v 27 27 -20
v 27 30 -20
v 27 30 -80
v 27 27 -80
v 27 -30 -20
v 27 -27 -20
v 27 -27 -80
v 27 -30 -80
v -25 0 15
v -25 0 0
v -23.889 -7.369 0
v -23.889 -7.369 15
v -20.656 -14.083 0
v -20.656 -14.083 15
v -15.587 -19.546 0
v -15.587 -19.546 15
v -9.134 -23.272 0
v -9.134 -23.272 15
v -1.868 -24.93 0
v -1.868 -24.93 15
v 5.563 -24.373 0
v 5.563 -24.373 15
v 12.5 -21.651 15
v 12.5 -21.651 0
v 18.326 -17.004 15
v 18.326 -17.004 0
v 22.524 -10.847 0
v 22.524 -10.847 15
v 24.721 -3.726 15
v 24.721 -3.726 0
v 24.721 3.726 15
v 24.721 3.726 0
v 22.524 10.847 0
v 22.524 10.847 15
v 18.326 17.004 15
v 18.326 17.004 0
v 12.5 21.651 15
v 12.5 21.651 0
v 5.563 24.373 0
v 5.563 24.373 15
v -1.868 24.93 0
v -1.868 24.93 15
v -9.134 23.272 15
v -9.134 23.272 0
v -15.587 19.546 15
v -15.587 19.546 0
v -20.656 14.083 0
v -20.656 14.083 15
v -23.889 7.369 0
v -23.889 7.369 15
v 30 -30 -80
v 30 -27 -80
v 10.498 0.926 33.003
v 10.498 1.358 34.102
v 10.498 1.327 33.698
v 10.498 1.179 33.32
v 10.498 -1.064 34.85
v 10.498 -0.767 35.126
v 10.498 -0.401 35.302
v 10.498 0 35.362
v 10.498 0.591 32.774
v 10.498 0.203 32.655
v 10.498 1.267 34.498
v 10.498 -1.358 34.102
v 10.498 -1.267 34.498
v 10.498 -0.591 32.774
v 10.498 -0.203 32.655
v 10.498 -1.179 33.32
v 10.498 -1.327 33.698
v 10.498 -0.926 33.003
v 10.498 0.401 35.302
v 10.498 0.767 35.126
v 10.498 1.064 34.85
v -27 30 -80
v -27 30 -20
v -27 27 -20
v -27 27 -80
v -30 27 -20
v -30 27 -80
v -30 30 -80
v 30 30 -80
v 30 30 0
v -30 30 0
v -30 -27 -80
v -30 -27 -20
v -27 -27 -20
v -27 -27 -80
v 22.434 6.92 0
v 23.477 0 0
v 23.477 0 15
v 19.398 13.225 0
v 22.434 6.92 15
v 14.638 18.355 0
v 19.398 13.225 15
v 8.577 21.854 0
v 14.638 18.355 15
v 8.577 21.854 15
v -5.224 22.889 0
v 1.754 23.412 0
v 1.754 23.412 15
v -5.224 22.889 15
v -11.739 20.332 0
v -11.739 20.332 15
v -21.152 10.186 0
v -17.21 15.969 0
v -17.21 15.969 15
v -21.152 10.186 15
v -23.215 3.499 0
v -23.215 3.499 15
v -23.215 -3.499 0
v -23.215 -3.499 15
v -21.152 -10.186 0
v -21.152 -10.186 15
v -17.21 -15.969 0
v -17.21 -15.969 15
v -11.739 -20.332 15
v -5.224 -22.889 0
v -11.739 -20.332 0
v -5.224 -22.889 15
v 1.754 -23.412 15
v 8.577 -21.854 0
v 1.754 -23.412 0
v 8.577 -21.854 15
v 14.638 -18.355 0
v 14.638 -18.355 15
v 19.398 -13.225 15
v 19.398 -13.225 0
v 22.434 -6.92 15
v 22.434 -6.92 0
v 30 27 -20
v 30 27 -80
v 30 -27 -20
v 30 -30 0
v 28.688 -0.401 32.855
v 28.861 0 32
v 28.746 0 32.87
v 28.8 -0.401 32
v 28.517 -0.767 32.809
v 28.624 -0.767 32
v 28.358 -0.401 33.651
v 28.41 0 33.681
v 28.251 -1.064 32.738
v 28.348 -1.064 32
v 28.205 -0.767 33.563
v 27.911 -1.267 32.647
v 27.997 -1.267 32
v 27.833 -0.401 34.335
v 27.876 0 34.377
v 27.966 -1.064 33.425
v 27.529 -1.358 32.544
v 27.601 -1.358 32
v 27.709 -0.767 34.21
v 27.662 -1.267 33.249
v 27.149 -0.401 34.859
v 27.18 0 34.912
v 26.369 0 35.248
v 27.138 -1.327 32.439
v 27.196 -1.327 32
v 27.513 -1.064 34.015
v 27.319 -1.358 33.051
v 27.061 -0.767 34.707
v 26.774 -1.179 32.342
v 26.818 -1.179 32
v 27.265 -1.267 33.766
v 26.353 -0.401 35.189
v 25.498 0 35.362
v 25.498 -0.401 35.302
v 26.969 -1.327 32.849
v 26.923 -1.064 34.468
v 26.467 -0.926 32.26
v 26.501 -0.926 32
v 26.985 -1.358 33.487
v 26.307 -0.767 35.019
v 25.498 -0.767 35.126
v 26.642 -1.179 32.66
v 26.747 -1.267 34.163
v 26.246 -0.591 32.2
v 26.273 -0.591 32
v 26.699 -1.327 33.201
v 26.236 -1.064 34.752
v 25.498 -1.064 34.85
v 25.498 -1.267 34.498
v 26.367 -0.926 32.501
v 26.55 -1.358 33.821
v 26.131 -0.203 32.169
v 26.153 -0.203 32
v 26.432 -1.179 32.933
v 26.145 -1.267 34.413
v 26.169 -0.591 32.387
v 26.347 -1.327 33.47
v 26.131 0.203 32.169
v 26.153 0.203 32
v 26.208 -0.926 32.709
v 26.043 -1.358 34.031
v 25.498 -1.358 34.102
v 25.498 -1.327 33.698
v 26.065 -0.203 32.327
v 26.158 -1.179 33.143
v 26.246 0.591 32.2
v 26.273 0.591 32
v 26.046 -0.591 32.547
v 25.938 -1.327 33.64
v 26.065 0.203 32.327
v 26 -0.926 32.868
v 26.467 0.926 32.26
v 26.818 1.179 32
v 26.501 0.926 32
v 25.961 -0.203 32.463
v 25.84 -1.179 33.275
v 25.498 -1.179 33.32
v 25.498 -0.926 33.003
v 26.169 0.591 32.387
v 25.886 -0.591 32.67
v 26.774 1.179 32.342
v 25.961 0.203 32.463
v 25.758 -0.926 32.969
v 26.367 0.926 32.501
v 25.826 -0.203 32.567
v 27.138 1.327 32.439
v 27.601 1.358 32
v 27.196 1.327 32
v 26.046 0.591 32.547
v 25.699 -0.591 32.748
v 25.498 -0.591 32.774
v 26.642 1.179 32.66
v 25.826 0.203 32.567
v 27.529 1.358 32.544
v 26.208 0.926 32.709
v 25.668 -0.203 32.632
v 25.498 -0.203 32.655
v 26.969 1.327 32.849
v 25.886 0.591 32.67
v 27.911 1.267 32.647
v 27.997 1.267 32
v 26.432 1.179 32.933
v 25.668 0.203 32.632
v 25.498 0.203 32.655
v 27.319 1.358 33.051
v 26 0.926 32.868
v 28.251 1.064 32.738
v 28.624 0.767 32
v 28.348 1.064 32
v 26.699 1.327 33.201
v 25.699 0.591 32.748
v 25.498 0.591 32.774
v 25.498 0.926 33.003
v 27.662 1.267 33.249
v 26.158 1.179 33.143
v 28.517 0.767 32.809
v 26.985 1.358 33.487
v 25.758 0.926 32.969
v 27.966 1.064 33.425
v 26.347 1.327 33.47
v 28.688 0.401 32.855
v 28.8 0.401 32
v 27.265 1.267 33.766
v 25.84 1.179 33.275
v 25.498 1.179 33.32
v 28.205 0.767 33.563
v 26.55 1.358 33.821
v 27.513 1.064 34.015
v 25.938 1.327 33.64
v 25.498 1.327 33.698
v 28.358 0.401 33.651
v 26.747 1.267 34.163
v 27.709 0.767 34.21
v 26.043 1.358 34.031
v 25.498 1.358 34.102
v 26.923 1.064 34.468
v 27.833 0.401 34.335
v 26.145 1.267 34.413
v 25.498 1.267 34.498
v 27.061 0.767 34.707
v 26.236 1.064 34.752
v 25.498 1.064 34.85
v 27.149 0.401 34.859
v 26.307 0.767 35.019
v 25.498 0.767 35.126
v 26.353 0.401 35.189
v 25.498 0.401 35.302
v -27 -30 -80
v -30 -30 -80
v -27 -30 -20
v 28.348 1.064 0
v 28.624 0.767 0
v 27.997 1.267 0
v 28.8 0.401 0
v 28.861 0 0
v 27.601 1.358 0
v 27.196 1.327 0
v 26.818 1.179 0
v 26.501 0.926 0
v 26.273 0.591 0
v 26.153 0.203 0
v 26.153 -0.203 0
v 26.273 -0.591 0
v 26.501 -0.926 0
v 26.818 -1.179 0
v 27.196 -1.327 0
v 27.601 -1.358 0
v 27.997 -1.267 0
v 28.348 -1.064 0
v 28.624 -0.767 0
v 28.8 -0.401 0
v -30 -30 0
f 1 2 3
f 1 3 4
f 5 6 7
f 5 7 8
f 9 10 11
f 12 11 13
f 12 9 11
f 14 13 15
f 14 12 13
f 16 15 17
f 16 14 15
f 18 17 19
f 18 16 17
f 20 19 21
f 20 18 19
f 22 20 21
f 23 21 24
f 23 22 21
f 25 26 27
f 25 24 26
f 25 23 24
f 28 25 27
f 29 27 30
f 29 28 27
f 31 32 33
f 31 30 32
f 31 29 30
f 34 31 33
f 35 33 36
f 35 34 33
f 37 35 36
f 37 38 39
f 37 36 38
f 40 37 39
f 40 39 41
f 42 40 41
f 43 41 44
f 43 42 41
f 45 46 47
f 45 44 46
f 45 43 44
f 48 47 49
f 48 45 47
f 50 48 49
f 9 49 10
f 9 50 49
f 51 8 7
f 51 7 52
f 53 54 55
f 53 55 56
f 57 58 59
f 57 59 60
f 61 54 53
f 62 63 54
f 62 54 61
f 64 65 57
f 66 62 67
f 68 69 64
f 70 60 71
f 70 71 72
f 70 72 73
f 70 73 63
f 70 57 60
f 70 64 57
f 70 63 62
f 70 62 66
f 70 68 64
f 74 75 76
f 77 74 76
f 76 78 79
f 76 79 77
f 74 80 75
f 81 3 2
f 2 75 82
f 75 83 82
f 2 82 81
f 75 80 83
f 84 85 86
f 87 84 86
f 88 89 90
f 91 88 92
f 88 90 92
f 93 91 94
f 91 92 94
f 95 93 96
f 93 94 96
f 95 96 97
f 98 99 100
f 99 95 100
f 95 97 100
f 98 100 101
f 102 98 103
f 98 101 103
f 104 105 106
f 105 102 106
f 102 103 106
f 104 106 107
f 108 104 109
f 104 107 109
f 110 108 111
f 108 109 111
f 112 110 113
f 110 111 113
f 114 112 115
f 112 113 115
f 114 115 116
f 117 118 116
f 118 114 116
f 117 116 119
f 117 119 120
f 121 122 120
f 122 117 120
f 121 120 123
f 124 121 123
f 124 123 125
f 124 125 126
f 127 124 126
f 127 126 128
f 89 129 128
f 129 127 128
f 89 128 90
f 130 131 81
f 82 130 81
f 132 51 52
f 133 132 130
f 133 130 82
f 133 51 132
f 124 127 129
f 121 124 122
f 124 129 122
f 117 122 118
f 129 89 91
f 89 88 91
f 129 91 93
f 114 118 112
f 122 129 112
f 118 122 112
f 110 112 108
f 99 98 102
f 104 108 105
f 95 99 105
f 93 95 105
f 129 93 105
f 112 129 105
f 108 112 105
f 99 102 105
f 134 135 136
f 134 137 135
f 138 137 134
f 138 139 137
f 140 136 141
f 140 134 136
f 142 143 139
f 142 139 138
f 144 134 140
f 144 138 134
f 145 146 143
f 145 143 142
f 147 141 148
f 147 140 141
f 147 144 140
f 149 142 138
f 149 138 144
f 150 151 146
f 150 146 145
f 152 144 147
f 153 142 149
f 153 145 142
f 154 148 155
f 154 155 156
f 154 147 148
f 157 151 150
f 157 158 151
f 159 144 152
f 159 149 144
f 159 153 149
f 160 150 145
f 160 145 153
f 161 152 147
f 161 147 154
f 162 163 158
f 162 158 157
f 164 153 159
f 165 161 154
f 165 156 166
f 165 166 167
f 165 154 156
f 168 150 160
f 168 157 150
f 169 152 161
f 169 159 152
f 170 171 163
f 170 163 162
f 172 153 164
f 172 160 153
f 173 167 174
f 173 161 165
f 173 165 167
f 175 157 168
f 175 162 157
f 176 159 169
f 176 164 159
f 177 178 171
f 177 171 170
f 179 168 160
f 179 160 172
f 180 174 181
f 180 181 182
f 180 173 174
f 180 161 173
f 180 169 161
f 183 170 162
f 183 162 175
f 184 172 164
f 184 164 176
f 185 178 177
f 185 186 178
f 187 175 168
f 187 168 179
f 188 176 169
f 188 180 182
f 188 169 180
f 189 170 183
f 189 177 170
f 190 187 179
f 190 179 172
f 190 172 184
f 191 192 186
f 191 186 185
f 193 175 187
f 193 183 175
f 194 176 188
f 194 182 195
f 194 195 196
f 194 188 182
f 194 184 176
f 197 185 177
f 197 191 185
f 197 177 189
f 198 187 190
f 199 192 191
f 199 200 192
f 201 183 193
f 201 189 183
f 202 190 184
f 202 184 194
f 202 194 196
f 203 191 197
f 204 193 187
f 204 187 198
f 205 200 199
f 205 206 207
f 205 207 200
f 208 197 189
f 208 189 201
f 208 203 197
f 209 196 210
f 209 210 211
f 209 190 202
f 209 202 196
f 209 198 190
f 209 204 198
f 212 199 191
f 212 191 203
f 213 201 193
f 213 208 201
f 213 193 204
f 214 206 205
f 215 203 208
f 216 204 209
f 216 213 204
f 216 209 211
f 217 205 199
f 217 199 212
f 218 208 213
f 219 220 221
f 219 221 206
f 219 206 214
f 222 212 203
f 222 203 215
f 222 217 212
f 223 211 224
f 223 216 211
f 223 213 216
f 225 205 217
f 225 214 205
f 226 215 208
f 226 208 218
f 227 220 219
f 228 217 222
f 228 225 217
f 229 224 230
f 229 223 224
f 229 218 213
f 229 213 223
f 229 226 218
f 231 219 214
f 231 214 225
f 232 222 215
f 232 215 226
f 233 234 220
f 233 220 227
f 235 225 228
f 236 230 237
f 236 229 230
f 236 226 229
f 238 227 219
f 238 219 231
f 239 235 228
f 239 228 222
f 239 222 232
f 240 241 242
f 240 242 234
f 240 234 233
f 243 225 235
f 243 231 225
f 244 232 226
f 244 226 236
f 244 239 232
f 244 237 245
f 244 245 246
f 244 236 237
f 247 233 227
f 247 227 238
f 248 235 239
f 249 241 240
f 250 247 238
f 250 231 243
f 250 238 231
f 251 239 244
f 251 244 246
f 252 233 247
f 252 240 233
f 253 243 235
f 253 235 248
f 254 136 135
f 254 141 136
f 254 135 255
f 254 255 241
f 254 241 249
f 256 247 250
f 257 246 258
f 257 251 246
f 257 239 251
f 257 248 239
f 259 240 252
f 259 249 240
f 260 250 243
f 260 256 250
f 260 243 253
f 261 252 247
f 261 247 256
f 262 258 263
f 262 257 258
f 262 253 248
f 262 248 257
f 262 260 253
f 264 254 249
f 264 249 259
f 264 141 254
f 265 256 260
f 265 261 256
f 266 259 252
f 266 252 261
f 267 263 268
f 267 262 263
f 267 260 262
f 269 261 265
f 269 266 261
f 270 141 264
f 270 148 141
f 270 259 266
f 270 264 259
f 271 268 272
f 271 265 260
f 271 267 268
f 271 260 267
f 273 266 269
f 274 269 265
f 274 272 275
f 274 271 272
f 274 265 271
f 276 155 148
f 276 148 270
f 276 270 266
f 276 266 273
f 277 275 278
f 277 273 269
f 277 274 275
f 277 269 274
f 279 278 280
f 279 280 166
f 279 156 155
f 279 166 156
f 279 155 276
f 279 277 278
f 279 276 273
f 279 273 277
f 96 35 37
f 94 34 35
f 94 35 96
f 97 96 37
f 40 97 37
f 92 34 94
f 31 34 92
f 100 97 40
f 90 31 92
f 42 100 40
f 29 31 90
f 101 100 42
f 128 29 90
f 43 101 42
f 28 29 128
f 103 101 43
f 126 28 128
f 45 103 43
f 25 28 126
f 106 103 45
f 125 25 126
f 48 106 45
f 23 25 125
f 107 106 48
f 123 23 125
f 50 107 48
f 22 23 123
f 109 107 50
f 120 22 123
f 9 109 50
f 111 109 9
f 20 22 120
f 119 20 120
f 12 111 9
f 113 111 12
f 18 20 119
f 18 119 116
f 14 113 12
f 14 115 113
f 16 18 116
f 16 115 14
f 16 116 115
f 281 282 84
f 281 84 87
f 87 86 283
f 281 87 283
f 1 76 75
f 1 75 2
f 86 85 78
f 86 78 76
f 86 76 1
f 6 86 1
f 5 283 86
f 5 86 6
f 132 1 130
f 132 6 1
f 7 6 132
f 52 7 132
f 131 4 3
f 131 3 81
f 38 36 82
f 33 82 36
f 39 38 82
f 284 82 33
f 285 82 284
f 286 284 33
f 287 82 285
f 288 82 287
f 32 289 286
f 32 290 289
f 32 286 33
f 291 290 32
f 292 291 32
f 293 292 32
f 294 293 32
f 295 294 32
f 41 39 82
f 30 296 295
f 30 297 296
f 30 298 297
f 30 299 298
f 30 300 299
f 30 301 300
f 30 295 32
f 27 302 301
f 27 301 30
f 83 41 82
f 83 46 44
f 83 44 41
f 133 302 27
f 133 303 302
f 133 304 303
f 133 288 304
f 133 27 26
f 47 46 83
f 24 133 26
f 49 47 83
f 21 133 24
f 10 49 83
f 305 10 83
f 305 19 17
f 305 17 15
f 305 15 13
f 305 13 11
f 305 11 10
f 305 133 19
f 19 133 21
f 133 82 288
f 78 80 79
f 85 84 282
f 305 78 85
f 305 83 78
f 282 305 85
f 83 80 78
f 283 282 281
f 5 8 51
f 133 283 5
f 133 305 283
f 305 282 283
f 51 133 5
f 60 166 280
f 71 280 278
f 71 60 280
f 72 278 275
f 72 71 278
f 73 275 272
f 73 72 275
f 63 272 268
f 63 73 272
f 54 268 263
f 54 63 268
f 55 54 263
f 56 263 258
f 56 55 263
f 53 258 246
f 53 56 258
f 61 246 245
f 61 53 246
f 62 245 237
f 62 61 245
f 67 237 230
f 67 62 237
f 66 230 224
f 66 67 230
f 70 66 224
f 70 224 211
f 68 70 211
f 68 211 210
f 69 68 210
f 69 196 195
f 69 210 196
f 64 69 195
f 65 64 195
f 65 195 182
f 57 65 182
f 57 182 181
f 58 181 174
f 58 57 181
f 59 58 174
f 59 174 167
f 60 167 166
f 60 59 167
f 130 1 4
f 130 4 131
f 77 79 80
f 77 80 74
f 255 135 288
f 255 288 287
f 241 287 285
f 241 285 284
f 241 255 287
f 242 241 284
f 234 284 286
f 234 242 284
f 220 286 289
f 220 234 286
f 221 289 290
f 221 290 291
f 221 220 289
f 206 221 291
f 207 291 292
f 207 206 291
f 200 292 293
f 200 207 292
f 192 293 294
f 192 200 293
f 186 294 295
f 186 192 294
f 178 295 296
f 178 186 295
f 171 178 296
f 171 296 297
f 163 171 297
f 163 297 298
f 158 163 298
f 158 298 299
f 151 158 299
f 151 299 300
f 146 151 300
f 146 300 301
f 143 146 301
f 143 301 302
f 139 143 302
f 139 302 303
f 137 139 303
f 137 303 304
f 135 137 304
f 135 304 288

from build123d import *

# Parameters (mm, degrees)
F0_W          = 25
F0_H          = 15
F2_R          = 23.4773699194
F3_DEPTH      = 18.22955
F4_W          = 30
F4_H          = 20
F5_DEPTH      = 30
F5_DEPTH_BACK = 30
F7_R          = 1.3613777444
F9_W          = 3
F9_H          = 3
F10_DEPTH     = 60


with BuildPart() as f1:
    # F0 (on Front) → F1 (revolve)
    with BuildSketch(Plane.XZ):
        with Locations((-12.5, 7.5)):
            Rectangle(F0_W, F0_H)
    revolve(axis=Axis((0, 0, 7.5), (0, 0, 1)))

    # F2 (on face) → F3 (cut)
    with BuildSketch(Plane.XY.offset(15)):
        Circle(F2_R)
    extrude(amount=-F3_DEPTH, mode=Mode.SUBTRACT)

    # F4 (on Front) → F5 (join, two sides)
    with BuildSketch(Plane.XZ) as f5_sk:
        with Locations((15, -10)):
            Rectangle(F4_W, F4_H)
        with Locations((-15, -10)):
            Rectangle(F4_W, F4_H)
    extrude(amount=F5_DEPTH)
    extrude(f5_sk.sketch, amount=-F5_DEPTH_BACK)

    # F8: sweep along a path in F6
    with BuildLine(Plane.XZ) as f8_path:
        Line((27.4984519929, 0), (27.4984519929, 32))
        ThreePointArc((27.4984519929, 32), (26.9126655552, 33.4142135624), (25.4984519929, 34))
        Line((25.4984519929, 34), (10.4984519929, 34))
    # F7 (on Top) → F8 (sweep)
    with BuildSketch(Plane.XY):
        with Locations((27.4991728365, 0)):
            Circle(F7_R)
    sweep(path=f8_path.line)

    # F9 (on face) → F10 (join)
    with BuildSketch(Plane(origin=(0, 0, -20), x_dir=(1, 0, 0), z_dir=(0, 0, -1))):
        with Locations((-28.5, 28.5)):
            Rectangle(F9_W, F9_H)
        with Locations((28.5, 28.5)):
            Rectangle(F9_W, F9_H)
        with Locations((-28.5, -28.5)):
            Rectangle(F9_W, F9_H)
        with Locations((28.5, -28.5)):
            Rectangle(F9_W, F9_H)
    extrude(amount=F10_DEPTH)


solid = f1.part
